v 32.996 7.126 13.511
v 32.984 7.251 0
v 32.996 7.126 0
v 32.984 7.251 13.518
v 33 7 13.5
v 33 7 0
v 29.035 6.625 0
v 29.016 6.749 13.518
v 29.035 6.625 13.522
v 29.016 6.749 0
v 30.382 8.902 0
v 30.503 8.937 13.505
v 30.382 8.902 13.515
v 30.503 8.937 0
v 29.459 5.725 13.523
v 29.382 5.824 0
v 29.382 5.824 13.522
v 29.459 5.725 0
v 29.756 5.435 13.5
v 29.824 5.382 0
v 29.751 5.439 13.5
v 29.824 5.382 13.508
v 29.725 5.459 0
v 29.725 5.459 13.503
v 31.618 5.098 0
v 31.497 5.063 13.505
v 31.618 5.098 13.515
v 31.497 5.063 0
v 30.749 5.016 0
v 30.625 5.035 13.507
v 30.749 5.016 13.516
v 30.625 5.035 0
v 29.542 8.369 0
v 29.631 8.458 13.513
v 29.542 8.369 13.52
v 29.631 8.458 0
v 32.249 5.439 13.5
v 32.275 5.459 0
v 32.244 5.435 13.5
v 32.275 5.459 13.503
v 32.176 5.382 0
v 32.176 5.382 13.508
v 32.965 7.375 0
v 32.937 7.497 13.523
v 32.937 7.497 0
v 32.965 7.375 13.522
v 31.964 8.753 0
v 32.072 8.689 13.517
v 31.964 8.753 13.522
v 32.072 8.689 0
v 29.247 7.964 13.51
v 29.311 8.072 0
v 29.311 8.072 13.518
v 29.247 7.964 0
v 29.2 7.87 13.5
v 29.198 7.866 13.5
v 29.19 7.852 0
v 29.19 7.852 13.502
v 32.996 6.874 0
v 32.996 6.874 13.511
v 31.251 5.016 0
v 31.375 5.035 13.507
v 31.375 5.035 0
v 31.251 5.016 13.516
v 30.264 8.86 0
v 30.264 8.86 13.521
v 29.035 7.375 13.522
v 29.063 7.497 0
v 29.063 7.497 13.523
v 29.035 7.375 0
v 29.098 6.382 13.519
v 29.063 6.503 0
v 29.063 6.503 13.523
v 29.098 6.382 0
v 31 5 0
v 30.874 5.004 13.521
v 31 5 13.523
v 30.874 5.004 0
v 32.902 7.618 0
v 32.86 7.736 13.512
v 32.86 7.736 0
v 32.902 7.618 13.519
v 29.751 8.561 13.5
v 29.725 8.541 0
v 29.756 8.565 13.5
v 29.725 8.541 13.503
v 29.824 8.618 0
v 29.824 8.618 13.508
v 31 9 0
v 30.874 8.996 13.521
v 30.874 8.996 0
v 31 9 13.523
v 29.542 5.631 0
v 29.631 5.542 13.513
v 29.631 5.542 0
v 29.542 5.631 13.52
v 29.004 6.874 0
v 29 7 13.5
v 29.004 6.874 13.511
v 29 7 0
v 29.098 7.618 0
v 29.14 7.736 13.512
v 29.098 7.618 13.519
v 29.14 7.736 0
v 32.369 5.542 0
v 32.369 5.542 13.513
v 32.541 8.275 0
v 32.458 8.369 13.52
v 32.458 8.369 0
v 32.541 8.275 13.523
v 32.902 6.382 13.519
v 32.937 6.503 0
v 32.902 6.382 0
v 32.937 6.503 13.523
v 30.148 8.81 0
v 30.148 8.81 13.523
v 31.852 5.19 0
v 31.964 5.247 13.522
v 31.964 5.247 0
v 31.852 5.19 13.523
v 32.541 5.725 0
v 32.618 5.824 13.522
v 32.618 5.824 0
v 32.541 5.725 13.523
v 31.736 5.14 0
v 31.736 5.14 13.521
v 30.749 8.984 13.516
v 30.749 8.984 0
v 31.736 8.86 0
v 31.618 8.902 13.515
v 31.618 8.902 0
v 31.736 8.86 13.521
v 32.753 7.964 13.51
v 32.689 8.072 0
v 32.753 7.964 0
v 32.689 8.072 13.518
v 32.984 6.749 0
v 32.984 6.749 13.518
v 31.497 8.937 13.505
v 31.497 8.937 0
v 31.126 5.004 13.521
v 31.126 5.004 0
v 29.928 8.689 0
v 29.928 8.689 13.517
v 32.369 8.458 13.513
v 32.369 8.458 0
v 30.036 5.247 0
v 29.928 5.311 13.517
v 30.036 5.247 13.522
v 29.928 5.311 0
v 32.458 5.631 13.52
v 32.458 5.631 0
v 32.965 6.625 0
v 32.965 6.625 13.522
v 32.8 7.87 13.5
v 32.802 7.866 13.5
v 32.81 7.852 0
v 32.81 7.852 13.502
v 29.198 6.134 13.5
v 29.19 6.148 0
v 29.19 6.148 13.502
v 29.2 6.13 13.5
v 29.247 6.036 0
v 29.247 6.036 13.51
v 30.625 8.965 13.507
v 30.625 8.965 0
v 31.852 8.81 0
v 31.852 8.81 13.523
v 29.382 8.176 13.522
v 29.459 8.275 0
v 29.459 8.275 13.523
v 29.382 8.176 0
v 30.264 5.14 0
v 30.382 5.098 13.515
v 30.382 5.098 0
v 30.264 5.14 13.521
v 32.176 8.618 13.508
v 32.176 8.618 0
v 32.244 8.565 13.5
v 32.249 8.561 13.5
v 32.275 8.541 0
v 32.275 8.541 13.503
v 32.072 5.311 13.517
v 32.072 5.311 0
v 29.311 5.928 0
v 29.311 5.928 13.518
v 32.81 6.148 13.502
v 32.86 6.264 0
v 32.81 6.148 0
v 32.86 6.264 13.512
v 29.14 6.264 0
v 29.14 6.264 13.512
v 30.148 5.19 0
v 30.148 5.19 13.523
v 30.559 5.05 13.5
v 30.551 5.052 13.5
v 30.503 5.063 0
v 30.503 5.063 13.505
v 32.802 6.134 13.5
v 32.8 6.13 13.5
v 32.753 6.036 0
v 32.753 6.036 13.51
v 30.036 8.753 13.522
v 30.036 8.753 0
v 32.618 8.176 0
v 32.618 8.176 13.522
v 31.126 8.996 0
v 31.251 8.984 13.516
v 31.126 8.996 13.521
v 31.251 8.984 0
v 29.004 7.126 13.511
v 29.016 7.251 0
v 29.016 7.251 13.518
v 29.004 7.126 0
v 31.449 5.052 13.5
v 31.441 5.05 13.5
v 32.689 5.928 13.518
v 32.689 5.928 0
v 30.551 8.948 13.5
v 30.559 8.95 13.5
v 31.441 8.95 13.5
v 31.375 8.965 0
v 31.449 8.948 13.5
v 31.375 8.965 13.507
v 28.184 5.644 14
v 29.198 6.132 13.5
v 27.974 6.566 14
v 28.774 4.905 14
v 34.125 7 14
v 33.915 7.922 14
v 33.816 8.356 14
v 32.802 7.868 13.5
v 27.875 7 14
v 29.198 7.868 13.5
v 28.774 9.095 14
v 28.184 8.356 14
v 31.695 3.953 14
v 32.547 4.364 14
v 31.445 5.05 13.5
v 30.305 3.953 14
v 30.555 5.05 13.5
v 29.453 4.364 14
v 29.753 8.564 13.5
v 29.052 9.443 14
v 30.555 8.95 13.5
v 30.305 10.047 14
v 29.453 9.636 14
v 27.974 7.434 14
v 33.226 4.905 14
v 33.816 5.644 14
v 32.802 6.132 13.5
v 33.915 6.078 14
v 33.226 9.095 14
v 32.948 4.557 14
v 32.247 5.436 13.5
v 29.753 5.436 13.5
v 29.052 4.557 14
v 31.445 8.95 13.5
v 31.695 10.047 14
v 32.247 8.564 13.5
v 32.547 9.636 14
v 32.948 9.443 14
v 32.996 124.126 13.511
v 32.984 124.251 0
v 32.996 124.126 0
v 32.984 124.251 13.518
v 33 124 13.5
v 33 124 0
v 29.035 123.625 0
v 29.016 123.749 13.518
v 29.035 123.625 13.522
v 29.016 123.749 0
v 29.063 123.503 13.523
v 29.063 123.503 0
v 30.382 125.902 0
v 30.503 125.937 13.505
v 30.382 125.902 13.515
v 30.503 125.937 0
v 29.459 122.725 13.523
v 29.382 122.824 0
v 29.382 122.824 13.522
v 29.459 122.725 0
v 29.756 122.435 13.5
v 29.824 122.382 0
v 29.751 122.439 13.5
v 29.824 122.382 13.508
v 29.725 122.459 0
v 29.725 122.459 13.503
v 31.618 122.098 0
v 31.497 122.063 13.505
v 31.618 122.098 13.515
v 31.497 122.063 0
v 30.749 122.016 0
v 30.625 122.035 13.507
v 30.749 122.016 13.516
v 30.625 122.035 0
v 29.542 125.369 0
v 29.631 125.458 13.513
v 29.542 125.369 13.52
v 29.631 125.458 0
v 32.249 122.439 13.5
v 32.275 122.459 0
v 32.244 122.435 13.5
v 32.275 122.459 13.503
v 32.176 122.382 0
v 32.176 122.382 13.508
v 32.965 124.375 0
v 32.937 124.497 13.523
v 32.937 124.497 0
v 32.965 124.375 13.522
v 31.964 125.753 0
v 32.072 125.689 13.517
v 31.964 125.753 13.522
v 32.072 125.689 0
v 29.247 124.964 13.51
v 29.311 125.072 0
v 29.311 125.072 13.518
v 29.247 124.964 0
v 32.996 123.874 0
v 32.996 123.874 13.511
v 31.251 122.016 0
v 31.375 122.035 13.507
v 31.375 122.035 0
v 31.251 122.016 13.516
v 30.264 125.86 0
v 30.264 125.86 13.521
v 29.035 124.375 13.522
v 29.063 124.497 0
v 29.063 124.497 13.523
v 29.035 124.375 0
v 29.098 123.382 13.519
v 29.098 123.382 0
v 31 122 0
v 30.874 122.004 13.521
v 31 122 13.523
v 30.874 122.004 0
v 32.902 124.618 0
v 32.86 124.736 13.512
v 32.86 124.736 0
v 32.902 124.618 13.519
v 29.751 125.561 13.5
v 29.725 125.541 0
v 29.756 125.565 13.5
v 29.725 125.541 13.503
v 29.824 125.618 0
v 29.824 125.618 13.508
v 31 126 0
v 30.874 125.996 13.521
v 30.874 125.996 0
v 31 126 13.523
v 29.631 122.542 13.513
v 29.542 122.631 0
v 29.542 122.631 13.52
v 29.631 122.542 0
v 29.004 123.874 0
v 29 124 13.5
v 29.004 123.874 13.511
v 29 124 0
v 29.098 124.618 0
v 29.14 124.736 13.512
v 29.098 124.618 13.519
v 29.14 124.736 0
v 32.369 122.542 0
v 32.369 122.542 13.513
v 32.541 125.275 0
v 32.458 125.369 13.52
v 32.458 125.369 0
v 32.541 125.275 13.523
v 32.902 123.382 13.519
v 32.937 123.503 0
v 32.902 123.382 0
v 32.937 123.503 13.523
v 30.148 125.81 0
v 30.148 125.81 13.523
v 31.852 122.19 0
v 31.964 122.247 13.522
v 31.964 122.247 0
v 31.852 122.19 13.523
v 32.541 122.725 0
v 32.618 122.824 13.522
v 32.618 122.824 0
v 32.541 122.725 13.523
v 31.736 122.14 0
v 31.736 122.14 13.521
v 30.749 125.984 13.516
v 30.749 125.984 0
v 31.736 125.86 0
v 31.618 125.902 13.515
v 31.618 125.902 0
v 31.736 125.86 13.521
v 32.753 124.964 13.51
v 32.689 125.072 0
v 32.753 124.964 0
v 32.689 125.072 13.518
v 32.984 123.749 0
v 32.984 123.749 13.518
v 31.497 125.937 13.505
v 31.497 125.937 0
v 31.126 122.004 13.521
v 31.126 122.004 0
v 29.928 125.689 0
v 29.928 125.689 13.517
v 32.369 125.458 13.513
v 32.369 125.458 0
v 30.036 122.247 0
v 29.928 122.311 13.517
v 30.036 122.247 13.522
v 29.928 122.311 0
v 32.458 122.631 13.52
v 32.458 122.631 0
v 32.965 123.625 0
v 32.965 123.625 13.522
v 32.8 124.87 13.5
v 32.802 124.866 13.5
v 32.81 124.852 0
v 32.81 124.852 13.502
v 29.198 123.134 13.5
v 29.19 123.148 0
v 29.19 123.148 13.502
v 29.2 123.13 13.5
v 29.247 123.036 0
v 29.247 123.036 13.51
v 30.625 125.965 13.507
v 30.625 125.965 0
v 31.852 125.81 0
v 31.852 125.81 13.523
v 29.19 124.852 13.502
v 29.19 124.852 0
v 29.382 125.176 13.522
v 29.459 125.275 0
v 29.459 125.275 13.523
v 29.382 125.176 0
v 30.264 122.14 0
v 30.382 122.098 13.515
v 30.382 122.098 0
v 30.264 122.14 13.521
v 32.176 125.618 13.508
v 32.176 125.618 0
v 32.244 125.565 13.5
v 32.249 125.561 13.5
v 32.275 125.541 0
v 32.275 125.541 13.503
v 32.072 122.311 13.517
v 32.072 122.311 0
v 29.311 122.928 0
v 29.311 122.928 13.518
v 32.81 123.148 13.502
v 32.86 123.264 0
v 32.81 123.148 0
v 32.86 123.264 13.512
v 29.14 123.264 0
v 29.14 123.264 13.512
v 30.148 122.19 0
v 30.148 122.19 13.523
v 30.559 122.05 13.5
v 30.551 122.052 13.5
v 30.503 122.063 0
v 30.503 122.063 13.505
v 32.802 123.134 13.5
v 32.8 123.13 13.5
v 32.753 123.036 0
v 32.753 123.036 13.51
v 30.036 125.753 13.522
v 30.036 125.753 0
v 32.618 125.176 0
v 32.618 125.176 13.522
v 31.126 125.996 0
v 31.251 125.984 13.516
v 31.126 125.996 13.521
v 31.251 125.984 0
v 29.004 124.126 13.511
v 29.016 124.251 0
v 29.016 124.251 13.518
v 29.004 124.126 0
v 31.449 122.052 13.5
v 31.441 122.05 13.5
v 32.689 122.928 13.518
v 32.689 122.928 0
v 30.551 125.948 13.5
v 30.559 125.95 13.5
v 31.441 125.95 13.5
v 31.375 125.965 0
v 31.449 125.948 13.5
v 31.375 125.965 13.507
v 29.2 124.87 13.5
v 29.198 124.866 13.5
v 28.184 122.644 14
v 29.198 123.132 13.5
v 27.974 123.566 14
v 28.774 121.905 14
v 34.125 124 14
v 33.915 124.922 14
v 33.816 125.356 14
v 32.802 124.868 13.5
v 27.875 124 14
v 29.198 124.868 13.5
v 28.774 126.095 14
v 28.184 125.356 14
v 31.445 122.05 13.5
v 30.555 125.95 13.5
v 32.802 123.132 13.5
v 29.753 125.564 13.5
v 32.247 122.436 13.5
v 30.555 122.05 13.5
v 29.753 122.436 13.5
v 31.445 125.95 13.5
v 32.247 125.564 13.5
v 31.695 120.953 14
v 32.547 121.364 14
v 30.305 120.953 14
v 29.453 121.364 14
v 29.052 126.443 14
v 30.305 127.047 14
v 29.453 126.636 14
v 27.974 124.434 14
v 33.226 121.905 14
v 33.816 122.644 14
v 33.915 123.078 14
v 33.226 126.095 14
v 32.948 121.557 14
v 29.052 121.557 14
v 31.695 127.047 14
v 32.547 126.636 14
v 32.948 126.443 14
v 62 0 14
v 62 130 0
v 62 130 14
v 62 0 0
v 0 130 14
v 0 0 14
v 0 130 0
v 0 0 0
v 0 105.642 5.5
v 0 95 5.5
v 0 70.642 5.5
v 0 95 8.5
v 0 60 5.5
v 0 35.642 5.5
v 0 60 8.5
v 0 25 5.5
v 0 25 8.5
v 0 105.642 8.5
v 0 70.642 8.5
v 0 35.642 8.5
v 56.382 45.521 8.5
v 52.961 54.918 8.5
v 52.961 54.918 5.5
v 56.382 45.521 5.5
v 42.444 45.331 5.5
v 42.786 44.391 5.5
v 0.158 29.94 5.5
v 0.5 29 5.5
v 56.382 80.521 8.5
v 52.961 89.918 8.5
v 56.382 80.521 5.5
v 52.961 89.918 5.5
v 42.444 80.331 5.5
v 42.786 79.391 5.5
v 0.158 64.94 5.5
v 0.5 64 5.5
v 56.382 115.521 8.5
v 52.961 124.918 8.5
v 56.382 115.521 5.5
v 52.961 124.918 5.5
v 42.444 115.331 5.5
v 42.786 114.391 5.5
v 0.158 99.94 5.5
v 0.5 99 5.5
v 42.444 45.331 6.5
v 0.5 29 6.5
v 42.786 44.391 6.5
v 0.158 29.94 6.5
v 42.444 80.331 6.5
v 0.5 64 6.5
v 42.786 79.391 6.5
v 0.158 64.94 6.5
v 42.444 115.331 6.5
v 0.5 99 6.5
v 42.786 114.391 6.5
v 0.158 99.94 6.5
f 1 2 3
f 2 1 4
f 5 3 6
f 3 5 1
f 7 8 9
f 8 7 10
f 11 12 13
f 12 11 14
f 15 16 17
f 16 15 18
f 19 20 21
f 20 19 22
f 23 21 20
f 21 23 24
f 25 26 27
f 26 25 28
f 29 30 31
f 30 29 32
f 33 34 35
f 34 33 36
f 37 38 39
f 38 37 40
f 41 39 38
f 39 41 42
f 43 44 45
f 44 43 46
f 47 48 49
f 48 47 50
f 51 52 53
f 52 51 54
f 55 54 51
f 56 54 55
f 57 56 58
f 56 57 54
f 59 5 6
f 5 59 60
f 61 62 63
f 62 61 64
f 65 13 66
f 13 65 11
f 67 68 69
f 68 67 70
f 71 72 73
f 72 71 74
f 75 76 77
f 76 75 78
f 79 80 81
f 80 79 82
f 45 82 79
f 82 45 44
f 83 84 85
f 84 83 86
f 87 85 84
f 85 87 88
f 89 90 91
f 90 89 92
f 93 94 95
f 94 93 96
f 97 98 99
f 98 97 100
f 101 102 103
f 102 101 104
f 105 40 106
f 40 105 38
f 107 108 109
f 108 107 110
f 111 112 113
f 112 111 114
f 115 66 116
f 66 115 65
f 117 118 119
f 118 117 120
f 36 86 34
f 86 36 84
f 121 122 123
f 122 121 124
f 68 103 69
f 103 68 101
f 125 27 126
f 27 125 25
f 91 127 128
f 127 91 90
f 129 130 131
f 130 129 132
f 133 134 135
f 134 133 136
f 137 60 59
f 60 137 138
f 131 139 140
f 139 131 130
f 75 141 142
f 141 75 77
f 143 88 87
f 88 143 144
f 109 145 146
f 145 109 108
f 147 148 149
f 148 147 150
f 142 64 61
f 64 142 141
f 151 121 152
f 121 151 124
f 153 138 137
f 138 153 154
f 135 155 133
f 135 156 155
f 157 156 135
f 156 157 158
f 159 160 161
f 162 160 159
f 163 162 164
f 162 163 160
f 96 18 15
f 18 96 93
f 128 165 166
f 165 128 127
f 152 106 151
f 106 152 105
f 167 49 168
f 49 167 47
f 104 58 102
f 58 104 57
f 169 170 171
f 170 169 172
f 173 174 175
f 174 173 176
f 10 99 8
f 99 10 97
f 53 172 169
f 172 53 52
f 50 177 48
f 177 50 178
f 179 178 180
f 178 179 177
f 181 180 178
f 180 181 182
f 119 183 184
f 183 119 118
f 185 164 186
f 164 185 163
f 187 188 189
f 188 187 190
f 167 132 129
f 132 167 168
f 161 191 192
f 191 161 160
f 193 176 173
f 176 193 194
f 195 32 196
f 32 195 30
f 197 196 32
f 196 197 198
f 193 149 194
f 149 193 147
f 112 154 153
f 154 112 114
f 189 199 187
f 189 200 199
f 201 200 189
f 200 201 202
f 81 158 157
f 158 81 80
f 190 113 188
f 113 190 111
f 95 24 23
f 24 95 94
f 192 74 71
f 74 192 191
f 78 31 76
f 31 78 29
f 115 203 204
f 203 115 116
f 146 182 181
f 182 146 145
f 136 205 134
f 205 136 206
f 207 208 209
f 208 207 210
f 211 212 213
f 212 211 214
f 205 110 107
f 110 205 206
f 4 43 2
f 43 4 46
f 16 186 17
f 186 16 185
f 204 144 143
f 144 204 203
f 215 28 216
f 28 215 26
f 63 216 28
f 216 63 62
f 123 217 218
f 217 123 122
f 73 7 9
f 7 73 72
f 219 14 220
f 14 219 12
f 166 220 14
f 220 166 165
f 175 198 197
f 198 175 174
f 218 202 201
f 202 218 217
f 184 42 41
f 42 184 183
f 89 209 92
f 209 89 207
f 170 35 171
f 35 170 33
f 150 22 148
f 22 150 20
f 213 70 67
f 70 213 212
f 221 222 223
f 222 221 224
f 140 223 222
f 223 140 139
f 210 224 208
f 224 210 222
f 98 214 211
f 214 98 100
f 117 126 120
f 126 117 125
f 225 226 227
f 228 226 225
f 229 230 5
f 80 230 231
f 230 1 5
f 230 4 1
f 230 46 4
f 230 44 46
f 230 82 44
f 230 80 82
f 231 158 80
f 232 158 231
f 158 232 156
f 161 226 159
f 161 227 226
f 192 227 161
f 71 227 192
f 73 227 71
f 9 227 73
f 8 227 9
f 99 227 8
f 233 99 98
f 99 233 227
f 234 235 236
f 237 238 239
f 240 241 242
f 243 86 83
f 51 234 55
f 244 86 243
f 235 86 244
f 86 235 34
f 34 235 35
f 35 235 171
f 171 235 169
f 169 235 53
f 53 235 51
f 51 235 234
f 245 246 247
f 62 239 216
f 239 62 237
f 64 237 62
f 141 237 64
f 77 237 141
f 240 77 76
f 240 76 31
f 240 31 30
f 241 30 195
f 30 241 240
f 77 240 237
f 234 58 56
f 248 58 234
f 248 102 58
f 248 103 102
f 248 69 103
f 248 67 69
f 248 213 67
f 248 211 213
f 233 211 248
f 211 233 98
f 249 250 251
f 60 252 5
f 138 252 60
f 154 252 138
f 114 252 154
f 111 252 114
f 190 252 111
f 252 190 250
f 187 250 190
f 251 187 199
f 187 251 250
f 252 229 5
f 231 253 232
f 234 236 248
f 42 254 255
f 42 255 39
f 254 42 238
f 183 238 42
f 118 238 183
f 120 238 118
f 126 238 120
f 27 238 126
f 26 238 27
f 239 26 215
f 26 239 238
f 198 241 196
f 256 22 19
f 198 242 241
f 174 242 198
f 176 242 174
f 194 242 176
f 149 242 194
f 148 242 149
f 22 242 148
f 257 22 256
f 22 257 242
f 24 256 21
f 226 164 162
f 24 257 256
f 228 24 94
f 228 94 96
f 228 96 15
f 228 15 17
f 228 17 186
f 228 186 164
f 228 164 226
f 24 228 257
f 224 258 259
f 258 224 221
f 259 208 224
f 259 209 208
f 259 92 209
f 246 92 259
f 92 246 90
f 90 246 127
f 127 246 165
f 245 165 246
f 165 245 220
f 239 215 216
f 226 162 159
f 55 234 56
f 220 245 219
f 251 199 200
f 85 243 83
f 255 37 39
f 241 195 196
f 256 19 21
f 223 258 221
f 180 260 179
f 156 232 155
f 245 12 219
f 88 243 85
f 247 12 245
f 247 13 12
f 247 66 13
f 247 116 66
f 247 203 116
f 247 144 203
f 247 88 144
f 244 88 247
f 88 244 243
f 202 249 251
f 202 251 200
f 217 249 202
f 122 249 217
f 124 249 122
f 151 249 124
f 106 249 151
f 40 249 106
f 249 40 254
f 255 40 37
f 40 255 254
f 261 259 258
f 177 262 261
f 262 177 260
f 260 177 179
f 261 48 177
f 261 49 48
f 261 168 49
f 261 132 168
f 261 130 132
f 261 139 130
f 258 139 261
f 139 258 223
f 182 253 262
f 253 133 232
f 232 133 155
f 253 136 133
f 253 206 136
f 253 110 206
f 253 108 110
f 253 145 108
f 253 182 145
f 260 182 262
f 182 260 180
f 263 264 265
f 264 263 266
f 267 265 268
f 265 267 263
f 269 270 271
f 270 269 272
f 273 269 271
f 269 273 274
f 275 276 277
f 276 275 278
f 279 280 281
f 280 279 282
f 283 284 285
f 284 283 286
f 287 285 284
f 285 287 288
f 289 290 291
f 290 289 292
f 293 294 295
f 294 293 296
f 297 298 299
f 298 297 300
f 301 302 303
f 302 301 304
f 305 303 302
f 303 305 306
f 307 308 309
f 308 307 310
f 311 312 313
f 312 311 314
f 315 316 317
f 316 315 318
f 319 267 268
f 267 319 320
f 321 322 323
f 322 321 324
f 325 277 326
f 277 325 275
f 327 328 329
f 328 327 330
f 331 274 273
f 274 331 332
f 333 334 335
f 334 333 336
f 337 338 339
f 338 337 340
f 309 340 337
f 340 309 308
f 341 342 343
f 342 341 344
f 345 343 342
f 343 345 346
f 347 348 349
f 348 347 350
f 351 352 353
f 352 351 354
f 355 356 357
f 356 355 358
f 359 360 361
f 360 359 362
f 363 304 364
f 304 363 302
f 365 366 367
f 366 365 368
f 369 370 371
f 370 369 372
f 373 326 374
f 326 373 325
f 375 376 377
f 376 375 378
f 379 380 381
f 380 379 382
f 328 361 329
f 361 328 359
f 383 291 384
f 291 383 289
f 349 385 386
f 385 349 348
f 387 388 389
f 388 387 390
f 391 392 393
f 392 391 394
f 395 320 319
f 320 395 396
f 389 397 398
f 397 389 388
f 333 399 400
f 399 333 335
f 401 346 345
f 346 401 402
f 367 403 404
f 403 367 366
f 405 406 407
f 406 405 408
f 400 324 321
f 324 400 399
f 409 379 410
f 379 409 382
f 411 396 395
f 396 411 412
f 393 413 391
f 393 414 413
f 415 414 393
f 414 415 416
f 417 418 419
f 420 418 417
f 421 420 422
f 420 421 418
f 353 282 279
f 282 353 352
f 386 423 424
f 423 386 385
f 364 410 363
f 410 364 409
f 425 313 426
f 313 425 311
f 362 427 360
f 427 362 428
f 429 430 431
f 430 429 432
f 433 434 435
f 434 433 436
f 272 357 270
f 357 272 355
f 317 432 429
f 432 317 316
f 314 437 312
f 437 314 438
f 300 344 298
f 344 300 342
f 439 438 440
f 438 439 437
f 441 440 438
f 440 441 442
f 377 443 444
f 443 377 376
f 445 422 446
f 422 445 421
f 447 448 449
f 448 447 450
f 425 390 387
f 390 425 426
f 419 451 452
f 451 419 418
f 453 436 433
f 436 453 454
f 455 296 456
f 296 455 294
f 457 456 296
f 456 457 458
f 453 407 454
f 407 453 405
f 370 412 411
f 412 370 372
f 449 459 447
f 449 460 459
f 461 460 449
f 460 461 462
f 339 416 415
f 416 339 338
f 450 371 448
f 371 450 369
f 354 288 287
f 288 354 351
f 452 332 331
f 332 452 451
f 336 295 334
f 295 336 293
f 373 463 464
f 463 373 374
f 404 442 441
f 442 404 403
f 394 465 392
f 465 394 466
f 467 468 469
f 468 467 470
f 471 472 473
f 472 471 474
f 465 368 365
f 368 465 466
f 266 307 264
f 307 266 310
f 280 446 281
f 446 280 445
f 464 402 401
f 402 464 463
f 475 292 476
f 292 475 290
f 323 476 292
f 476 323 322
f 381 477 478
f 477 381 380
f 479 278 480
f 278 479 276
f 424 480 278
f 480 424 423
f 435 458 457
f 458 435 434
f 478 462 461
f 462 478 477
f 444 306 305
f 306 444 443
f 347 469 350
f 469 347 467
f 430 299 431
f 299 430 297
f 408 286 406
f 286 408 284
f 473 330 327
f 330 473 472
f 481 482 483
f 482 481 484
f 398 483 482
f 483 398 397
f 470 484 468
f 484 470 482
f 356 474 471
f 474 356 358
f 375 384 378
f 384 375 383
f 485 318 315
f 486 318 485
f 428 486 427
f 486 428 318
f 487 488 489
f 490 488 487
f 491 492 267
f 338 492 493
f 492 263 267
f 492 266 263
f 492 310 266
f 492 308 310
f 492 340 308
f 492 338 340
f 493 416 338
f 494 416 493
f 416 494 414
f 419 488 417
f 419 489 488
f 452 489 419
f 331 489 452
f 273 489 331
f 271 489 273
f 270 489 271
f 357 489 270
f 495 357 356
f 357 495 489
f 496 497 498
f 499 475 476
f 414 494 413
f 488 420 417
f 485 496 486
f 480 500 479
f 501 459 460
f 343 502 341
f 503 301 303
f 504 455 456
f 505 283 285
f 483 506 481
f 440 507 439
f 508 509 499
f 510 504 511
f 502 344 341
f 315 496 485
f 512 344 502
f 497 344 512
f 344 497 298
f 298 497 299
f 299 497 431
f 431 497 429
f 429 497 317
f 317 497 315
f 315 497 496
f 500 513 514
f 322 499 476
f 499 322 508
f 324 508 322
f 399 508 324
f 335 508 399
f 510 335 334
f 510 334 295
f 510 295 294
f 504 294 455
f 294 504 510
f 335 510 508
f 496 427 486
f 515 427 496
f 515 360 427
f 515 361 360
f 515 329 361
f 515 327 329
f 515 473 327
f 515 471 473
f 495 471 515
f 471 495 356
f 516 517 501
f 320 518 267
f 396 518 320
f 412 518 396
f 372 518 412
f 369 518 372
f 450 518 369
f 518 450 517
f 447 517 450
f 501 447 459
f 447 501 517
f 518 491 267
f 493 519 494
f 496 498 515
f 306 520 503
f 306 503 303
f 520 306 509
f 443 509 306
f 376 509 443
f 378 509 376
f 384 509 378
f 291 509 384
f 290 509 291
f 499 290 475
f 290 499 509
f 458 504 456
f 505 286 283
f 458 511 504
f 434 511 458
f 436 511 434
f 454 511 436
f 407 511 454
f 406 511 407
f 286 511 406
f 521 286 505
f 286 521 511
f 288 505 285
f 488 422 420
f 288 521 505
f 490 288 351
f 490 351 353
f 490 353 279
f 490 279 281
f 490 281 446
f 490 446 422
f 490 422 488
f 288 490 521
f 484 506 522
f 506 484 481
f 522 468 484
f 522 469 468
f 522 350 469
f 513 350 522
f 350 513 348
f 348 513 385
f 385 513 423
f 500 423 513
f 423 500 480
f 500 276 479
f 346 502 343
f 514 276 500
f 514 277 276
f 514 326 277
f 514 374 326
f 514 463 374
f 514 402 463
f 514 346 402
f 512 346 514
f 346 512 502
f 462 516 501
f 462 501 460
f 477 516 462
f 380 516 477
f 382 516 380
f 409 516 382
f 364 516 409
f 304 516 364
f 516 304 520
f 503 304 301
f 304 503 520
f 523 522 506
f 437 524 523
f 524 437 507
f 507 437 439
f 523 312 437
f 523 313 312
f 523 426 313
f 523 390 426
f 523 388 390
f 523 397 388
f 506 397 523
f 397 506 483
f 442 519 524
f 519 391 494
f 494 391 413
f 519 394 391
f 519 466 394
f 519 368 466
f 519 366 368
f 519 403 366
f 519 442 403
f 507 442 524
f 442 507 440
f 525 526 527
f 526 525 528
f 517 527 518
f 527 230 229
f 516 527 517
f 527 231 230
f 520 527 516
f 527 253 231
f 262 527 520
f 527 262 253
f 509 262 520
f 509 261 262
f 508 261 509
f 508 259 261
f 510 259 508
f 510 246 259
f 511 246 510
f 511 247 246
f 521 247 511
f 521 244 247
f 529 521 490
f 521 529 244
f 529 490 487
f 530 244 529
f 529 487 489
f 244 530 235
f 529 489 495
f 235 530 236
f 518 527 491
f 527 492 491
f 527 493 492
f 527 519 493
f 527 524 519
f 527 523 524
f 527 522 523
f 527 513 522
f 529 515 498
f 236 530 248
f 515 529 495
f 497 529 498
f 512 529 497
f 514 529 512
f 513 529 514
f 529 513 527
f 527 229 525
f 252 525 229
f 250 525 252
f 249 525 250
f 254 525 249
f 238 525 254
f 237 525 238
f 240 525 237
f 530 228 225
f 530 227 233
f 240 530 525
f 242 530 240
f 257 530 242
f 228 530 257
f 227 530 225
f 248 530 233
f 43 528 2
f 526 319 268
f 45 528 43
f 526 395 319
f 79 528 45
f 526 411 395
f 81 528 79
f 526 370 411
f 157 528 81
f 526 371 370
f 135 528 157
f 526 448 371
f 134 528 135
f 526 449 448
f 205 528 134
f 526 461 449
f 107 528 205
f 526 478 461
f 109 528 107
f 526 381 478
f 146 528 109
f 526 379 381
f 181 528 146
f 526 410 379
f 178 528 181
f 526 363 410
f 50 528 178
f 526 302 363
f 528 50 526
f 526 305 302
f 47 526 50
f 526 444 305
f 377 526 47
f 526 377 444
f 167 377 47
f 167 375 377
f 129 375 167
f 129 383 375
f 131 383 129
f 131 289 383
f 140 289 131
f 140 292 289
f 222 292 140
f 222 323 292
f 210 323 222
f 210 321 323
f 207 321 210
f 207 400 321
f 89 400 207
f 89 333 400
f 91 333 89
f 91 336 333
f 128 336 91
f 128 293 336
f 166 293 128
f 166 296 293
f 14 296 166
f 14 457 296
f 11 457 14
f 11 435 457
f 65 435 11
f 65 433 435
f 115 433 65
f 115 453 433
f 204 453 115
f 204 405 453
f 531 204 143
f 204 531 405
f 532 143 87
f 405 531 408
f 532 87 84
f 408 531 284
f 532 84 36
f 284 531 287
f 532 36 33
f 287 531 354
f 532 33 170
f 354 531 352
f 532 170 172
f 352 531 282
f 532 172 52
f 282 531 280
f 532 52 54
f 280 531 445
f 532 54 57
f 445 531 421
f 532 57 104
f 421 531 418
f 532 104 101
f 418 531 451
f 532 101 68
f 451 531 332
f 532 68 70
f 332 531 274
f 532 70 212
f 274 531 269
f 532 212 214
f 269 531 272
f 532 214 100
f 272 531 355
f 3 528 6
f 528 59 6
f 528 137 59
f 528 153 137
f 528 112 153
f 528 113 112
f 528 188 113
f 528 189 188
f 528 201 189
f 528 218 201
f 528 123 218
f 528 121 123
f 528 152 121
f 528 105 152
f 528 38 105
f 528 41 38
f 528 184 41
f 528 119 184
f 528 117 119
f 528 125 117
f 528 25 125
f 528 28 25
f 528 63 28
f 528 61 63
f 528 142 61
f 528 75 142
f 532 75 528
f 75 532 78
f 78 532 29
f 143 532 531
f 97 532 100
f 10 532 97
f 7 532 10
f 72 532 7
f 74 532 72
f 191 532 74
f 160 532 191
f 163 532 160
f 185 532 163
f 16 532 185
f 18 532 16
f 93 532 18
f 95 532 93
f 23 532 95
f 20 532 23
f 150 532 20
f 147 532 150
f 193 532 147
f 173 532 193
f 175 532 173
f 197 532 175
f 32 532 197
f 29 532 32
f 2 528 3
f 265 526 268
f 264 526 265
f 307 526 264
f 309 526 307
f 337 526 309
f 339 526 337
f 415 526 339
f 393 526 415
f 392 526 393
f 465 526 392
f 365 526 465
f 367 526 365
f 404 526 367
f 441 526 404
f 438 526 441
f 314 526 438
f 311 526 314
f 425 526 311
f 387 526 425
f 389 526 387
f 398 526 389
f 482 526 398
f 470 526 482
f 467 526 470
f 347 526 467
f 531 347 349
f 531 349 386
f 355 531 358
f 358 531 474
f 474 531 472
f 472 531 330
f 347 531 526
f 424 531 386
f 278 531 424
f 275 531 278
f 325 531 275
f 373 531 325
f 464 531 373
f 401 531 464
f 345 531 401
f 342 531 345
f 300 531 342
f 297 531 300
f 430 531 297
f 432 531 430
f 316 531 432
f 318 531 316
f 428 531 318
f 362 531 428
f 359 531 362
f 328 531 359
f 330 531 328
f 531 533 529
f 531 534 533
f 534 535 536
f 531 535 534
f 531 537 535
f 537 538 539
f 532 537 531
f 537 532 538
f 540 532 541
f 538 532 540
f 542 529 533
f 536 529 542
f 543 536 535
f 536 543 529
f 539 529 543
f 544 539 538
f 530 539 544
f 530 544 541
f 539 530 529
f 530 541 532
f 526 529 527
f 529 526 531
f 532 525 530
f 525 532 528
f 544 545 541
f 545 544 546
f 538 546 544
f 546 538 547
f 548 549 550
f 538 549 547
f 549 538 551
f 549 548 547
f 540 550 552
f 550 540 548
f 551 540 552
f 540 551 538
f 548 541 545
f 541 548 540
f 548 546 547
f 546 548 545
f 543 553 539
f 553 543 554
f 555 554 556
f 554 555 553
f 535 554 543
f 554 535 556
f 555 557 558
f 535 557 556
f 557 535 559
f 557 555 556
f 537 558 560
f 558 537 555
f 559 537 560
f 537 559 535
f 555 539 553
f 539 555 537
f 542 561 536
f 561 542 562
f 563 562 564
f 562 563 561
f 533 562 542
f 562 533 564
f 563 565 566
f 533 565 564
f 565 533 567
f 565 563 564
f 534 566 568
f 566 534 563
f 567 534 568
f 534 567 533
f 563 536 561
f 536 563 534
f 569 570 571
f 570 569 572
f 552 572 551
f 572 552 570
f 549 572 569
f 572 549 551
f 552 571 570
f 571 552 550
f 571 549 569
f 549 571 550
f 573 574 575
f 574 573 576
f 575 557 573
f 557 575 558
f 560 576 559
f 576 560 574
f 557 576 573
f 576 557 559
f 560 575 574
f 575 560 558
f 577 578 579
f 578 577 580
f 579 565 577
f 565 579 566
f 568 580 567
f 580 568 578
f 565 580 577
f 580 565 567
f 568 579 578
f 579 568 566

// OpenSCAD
//118 62 14
//10 1MM 3



	module groove(){
	rotate(20, 0, 0)
	//scale([45, 1, 1])
	cube ([45, 1, 1]);
	}//groove module

	module keyhole(){ 
	rotate(20, 0, 0)
	//scale([60, 10, 3])
	cube ([60, 10, 3]);
	}//keyhold module

	module drillhole(){
	translate([31, 7,7 ])
	cylinder(h=16,r=2,$fn=100, center=true);
	translate([31,7,13.5])
	cylinder(h1=3,r1=2, r2=4.25);
	}

	module base(){
	//hull (){
	cube ([62, 130, 14]);
		/*translate([1,1,0])
		cylinder(h=14,r=2);
		translate([1,129,0])
		cylinder(h=14,r=2);
		translate([61,129,0])
		cylinder(h=14,r=2);
		translate([61,1,0])
		cylinder(h=14,r=2);*/
	//}//end hull
	}//end base


union (){
difference (){
base();

translate([0,25,5.5])
	keyhole();

translate([0,60,5.5])
	keyhole();

translate([0,95,5.5])
	keyhole();

	drillhole();
translate([0, 117, 0])
	drillhole();
}//difference

//grooves
color ("cyan", a=1.0)
translate([.5,29,5.5])
	groove();
translate([.5,64,5.5])
	groove();
translate([.5,99,5.5])
	groove();


//holder section

/*difference (){
color ("green", a=1.0)
translate([0 , 83.5, 13])
scale([62, 35, 16])
	cube (1, 1, 1);

translate([2.5 , 81.5, 13])
	cube ([57, 33, 13]);
}//end difference*/




}//end union
